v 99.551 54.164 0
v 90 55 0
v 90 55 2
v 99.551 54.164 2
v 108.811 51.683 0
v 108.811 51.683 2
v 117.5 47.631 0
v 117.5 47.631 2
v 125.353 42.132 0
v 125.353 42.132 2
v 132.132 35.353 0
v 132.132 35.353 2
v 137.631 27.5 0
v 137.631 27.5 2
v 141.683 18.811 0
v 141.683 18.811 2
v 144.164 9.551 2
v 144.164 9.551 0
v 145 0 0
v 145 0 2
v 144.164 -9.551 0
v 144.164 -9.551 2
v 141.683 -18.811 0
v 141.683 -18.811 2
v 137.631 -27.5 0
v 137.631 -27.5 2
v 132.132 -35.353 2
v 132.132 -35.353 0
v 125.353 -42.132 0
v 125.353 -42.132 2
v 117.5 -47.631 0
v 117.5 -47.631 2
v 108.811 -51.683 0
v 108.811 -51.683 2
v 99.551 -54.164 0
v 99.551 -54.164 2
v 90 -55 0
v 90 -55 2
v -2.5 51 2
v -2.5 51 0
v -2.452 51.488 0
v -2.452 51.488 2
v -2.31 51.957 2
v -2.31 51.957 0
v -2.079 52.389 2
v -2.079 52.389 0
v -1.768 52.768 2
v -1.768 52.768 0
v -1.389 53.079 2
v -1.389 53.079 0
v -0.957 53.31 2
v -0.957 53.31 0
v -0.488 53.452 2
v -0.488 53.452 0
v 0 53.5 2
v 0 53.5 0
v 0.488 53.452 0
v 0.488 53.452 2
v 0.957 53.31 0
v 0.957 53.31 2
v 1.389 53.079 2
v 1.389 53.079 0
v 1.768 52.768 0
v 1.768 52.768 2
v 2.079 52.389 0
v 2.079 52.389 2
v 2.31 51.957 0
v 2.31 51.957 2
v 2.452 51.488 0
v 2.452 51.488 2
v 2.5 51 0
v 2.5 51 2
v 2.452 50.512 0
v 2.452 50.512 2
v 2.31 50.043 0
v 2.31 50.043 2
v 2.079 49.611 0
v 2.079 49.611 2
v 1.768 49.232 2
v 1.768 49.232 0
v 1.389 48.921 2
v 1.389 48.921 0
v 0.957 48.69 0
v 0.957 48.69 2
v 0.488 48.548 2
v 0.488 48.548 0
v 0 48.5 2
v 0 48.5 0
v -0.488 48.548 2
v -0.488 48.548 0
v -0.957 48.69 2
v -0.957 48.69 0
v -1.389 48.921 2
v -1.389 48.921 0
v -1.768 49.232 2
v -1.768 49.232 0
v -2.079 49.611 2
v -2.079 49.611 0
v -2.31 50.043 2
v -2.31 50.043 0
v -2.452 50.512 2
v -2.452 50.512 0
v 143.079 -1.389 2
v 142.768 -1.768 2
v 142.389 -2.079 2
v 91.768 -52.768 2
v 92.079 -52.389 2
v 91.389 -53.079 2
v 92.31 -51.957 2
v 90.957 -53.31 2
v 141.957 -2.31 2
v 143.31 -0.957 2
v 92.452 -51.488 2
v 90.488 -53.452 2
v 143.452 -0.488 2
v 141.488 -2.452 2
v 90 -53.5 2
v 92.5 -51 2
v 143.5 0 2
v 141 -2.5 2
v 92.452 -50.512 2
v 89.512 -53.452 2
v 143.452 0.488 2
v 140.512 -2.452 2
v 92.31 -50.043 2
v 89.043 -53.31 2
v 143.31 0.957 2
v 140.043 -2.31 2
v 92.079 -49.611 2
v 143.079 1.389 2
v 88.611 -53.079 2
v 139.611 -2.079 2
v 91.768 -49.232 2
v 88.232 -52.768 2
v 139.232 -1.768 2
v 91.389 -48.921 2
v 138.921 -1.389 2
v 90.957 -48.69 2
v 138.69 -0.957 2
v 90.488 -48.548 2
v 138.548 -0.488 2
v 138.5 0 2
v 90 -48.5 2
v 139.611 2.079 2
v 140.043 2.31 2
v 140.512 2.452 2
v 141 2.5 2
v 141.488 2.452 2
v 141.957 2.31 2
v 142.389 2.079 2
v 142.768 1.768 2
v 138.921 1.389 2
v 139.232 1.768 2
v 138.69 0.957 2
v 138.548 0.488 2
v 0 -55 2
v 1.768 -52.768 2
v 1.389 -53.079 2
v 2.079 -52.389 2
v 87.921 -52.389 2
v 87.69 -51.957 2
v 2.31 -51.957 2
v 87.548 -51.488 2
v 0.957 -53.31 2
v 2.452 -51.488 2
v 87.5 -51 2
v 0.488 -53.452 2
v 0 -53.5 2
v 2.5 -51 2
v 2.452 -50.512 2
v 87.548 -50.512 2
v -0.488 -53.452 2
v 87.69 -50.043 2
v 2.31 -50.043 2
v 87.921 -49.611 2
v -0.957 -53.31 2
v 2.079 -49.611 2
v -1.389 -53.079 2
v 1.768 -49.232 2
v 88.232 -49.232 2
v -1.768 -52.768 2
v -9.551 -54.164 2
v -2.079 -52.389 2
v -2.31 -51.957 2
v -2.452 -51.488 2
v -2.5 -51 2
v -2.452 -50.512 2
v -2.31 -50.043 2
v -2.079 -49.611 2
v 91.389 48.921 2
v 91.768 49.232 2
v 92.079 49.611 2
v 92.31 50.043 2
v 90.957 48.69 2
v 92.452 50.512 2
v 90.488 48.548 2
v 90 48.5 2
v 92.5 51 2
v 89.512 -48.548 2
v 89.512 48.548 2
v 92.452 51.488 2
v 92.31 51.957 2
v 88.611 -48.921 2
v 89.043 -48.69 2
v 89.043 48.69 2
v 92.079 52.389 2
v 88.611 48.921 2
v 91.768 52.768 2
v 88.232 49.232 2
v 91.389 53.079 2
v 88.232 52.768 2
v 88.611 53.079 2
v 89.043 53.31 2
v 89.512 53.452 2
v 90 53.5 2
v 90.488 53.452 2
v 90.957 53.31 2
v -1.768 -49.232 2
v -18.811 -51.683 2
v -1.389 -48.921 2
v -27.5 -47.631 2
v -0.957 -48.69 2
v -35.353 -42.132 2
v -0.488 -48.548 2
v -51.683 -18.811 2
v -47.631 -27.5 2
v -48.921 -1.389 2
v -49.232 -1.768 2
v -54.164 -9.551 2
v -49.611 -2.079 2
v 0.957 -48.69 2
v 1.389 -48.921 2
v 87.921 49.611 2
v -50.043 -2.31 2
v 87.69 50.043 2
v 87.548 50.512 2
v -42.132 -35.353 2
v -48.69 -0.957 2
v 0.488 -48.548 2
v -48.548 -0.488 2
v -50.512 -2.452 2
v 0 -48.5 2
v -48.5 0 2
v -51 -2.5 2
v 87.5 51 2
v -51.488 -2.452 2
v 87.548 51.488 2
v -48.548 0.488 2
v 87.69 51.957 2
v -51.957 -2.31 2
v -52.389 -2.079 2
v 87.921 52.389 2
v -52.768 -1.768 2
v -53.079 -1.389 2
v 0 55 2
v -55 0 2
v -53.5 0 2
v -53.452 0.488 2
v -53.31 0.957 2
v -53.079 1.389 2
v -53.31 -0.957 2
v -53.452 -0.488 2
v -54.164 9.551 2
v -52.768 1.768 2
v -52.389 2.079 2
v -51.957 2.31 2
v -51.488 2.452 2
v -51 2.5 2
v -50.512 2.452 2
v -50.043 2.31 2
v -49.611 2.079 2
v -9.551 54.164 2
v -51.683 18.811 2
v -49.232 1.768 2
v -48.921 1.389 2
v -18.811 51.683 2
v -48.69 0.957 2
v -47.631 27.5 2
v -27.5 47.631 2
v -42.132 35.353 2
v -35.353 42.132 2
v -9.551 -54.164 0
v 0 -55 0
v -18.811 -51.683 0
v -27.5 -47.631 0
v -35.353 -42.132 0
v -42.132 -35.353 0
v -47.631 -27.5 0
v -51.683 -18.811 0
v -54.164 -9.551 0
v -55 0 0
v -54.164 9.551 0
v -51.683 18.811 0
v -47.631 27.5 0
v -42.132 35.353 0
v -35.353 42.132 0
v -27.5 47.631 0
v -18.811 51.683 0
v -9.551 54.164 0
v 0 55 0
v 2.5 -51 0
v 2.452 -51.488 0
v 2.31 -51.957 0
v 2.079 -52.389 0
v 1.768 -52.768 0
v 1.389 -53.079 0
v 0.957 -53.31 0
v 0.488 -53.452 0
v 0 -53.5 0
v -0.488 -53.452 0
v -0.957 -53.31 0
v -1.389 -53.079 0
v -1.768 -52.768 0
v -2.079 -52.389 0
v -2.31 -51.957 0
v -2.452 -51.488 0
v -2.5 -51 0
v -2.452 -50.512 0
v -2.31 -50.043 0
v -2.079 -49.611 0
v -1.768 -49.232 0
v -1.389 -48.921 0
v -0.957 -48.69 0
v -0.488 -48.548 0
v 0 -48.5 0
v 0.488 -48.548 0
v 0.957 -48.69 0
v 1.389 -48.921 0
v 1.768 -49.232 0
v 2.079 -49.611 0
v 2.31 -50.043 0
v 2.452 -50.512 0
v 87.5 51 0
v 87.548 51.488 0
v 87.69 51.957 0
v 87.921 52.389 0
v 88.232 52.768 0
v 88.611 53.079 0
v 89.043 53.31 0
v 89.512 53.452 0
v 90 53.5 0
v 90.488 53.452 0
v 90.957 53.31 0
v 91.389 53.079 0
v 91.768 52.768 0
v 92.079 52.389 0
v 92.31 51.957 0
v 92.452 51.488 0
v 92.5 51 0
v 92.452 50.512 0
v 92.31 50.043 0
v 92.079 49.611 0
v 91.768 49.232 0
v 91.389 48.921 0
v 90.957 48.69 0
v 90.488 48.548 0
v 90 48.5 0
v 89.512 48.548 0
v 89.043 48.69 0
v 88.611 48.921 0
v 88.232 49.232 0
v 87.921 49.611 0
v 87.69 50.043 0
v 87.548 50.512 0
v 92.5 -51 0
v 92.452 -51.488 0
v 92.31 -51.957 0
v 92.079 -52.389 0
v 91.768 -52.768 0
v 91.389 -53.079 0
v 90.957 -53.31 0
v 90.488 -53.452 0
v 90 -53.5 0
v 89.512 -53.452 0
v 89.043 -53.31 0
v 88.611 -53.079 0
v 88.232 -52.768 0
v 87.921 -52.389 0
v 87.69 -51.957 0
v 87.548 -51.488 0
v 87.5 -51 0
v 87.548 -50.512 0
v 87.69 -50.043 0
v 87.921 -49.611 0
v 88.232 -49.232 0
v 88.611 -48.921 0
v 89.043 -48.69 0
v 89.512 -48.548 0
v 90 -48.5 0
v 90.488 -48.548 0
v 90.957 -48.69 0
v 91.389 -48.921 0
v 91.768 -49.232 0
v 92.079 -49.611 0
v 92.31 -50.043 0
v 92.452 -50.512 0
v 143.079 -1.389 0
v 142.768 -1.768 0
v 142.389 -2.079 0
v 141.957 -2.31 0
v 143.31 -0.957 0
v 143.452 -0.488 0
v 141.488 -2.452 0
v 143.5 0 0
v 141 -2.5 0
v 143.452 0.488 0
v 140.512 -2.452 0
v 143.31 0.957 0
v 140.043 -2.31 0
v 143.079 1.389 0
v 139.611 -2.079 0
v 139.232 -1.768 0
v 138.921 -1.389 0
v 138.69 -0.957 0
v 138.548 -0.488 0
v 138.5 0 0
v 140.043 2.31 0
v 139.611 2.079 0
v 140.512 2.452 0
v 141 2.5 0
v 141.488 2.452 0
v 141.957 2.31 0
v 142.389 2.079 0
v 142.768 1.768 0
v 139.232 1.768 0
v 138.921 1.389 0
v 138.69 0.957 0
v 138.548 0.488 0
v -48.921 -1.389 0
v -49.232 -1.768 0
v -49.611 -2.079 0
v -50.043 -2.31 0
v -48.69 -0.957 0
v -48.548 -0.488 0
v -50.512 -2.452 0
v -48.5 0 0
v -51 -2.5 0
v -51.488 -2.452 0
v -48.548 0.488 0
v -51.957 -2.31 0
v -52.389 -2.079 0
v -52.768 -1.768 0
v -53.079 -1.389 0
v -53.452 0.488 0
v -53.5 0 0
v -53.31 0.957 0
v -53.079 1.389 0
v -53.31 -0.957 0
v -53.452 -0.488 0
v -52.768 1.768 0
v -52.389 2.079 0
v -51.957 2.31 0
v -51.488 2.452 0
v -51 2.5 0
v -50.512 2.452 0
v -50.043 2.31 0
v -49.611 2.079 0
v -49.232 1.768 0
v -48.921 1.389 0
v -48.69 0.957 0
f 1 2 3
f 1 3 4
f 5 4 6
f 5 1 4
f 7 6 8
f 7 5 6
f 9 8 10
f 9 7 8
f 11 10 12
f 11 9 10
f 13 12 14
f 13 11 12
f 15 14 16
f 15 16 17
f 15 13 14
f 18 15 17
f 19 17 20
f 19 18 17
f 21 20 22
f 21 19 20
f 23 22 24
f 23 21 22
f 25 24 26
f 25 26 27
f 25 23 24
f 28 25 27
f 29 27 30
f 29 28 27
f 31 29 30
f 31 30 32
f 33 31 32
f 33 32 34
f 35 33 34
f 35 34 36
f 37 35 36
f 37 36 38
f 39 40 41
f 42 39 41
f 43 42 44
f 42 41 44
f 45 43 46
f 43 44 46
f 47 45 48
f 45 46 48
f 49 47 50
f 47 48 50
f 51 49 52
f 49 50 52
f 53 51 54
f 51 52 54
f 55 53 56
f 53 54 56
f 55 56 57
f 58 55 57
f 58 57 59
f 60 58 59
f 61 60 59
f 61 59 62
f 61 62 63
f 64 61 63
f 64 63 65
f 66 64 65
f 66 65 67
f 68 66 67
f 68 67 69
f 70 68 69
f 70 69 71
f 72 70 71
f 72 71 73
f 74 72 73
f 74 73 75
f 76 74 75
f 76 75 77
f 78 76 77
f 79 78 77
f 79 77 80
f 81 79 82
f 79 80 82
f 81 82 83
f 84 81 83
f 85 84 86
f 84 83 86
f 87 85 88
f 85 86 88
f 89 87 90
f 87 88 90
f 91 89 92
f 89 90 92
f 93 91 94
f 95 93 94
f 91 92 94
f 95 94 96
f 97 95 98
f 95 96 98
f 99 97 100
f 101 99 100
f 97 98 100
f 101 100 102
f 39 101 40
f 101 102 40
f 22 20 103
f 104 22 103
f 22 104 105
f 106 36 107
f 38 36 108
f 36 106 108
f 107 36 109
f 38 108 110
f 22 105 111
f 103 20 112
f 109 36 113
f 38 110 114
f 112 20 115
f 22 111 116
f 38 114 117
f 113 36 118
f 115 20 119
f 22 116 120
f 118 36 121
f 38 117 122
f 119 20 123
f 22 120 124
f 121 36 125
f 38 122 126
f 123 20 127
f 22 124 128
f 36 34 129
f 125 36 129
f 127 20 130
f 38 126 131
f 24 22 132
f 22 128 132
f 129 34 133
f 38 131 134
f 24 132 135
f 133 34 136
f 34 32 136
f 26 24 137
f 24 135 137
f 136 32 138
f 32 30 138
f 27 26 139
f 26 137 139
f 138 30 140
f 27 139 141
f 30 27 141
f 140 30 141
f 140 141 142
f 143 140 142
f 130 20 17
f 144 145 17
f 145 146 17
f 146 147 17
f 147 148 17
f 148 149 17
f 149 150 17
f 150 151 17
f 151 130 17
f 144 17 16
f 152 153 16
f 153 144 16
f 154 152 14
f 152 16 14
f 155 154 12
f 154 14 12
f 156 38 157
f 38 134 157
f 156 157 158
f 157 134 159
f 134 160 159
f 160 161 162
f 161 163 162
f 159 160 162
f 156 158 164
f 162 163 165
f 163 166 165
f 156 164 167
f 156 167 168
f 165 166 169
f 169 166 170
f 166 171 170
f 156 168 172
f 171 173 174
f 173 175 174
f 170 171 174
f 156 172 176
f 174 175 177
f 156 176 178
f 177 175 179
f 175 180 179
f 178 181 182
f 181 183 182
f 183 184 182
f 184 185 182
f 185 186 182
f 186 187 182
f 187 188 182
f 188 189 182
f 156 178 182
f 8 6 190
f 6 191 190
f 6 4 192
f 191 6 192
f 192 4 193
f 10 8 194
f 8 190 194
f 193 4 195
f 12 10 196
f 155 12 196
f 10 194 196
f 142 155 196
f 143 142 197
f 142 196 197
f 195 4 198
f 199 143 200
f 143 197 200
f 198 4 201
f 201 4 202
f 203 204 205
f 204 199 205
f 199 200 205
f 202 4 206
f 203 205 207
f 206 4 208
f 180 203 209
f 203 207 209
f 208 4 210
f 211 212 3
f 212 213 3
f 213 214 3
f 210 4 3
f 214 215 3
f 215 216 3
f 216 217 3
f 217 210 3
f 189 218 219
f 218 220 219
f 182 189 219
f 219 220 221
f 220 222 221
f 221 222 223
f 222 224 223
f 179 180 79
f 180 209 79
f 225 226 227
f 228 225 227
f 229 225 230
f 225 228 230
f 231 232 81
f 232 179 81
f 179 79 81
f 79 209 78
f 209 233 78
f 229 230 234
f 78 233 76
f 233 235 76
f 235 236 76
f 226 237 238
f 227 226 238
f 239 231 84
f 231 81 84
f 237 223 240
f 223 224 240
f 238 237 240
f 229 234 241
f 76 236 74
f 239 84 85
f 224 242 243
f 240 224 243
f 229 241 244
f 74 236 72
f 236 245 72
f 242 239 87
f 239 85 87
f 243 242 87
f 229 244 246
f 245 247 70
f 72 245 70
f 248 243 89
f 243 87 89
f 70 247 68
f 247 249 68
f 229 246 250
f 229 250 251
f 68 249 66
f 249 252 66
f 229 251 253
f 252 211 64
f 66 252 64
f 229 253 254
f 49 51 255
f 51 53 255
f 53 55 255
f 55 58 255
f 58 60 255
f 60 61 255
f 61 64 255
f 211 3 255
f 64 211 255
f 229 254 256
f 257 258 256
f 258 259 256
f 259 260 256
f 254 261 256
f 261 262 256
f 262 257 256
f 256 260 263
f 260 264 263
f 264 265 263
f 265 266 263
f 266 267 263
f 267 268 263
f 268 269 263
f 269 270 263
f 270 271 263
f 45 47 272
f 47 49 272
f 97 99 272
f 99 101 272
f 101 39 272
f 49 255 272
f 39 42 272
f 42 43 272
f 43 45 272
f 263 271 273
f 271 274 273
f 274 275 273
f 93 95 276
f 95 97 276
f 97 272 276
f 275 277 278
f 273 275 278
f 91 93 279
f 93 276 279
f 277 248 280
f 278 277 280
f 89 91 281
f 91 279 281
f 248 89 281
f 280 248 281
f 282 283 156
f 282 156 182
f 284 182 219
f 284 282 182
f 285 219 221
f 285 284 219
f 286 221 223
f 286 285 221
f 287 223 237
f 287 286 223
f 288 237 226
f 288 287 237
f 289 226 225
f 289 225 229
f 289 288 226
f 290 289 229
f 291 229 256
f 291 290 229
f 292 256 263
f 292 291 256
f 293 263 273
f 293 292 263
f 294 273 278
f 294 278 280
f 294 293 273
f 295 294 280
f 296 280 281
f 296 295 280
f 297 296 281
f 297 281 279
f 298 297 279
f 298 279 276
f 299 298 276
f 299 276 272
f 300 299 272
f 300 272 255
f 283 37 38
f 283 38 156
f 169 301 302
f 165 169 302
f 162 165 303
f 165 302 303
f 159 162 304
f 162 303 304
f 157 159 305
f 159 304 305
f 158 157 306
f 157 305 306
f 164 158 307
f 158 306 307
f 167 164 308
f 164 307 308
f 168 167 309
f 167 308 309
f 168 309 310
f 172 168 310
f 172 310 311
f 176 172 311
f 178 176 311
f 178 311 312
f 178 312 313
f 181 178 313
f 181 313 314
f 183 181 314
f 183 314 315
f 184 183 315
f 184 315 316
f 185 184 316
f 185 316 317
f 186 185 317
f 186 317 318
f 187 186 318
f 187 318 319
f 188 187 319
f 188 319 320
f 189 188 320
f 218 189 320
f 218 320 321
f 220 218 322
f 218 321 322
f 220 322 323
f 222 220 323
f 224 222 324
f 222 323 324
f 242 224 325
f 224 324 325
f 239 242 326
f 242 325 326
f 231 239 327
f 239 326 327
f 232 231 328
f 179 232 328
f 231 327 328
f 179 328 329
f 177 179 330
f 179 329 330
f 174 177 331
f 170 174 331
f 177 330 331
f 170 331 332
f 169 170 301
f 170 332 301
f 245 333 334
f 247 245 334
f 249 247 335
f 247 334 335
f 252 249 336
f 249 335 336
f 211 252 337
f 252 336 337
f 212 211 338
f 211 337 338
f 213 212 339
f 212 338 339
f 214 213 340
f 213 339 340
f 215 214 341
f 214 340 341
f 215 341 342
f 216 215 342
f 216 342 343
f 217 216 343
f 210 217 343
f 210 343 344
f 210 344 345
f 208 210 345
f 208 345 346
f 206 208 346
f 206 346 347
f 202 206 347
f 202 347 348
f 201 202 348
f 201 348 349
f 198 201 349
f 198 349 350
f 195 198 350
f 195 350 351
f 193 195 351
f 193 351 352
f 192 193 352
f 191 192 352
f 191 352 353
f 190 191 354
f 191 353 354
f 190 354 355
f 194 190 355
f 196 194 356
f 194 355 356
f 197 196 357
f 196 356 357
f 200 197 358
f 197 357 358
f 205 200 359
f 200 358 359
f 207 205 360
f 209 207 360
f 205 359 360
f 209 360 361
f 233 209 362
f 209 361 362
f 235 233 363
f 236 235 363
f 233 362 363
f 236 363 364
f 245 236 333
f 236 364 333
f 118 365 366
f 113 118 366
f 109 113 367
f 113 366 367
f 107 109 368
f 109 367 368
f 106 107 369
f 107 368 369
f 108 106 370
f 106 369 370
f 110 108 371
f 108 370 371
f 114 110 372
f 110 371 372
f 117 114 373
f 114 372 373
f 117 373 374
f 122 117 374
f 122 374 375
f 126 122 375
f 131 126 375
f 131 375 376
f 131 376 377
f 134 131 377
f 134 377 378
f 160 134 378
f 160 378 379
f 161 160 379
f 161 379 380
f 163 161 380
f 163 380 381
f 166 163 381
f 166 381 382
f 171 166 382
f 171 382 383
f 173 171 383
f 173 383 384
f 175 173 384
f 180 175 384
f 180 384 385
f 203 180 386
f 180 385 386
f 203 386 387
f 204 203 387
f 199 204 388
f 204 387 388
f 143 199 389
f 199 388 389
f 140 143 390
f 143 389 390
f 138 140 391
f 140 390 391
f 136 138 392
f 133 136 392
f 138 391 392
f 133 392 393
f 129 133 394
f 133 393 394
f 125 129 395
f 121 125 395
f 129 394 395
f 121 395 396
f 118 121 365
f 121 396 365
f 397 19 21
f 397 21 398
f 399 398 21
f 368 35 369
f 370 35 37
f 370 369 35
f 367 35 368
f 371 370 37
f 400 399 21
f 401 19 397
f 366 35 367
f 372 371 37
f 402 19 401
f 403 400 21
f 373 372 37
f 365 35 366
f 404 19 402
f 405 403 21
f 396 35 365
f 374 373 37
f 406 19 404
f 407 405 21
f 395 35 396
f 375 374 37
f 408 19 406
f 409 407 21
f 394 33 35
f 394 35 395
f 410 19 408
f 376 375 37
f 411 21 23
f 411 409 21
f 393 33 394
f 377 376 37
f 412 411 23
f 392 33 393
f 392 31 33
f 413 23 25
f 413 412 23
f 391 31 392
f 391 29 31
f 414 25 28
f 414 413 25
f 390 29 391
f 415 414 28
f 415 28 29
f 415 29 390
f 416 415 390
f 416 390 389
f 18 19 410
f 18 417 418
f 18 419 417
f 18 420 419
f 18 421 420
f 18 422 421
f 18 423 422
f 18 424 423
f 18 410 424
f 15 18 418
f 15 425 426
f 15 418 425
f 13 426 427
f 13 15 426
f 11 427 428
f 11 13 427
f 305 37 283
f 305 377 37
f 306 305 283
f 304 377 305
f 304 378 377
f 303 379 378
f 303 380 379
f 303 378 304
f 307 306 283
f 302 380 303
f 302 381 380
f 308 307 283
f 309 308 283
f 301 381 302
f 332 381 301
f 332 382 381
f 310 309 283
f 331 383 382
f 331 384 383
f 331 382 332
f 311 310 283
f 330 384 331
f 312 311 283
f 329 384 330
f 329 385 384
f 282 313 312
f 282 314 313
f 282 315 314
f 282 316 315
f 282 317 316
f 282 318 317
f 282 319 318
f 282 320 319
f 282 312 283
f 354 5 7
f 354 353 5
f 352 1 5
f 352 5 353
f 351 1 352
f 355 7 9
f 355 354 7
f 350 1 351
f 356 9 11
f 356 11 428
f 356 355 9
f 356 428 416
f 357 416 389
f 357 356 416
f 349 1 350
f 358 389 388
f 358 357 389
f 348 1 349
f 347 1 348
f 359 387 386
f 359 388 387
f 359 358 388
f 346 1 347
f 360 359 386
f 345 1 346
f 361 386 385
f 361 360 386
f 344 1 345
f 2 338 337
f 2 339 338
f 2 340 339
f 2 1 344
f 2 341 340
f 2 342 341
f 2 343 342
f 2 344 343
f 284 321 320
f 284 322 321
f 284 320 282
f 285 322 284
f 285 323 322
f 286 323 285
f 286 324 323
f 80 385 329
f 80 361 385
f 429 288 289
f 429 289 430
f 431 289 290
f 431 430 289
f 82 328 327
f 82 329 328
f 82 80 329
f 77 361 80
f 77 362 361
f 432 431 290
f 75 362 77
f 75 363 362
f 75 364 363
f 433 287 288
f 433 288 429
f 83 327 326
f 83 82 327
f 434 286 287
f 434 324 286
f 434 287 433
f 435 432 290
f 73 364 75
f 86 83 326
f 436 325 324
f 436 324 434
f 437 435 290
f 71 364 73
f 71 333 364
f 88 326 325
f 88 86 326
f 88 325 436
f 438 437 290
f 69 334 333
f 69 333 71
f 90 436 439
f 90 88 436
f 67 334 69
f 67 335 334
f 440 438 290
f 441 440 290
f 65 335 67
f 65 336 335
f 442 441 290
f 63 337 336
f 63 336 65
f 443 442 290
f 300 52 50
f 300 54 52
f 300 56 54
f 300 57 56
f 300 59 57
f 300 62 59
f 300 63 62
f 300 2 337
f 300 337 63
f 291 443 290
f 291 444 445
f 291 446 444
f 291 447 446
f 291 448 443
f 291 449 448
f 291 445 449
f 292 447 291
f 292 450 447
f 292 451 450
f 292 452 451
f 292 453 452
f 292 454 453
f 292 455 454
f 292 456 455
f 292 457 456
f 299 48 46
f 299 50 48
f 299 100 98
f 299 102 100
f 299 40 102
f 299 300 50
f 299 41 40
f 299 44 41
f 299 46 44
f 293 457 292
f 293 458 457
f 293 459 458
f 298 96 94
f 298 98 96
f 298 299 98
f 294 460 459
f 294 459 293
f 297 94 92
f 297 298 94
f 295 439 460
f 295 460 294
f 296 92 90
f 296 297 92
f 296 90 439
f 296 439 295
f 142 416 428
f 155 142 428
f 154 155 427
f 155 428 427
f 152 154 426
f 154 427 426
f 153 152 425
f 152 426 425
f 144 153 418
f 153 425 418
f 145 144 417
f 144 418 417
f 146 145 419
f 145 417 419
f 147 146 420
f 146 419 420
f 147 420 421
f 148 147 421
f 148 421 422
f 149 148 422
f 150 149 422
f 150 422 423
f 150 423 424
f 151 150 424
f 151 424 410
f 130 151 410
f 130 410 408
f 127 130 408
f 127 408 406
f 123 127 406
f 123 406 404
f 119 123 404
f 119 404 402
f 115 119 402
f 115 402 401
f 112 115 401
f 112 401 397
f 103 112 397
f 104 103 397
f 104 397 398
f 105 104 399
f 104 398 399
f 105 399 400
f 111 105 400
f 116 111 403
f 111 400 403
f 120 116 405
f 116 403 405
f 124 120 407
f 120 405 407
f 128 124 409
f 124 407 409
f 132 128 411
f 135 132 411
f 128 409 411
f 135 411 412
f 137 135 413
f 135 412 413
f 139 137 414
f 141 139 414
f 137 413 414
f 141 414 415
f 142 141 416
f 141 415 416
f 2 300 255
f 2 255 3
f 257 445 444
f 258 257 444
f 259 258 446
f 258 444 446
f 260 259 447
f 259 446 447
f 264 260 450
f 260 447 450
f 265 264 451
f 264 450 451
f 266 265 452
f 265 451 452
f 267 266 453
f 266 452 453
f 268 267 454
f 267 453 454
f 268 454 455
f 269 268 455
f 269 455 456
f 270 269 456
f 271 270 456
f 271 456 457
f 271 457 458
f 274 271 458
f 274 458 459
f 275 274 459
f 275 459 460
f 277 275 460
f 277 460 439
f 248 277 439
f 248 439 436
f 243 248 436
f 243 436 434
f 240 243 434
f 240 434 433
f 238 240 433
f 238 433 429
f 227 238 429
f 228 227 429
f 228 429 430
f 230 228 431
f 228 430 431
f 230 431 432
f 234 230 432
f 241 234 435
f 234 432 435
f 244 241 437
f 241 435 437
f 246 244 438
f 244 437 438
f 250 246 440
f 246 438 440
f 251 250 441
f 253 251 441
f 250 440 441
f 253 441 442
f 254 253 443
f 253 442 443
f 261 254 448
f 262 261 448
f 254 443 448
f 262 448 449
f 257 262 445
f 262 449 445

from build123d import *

# Parameters (mm, degrees)
EXTRUDE_1_DEPTH     = 2
SKETCH_2_R          = 2.5
CUT_EXTRUDE_1_DEPTH = 10


with BuildPart() as part:
    # 草图1 → 拉伸1 (new body)
    with BuildSketch(Plane.XY):
        with BuildLine():
            Line((0, 55), (90, 55))
            ThreePointArc((90, 55), (145, 0), (90, -55))
            Line((90, -55), (0, -55))
            ThreePointArc((0, -55), (-55, 0), (0, 55))
        make_face()
    extrude(amount=EXTRUDE_1_DEPTH)

    # 草图2 → 切除-拉伸1 (cut)
    with BuildSketch(Plane(origin=(0, 0, 0), x_dir=(-1, 0, 0), z_dir=(0, 0, -1))):
        with Locations((-90, 51)):
            Circle(SKETCH_2_R)
        with Locations((0, 51)):
            Circle(SKETCH_2_R)
        with Locations((51, 0)):
            Circle(SKETCH_2_R)
        with Locations(Location((0, -51, 0), (0, 0, 180))):
            Circle(SKETCH_2_R)
        with Locations(Location((-90, -51, 0), (0, 0, 180))):
            Circle(SKETCH_2_R)
        with Locations((-141, 0)):
            Circle(SKETCH_2_R)
    extrude(amount=-CUT_EXTRUDE_1_DEPTH, mode=Mode.SUBTRACT)


solid = part.part
